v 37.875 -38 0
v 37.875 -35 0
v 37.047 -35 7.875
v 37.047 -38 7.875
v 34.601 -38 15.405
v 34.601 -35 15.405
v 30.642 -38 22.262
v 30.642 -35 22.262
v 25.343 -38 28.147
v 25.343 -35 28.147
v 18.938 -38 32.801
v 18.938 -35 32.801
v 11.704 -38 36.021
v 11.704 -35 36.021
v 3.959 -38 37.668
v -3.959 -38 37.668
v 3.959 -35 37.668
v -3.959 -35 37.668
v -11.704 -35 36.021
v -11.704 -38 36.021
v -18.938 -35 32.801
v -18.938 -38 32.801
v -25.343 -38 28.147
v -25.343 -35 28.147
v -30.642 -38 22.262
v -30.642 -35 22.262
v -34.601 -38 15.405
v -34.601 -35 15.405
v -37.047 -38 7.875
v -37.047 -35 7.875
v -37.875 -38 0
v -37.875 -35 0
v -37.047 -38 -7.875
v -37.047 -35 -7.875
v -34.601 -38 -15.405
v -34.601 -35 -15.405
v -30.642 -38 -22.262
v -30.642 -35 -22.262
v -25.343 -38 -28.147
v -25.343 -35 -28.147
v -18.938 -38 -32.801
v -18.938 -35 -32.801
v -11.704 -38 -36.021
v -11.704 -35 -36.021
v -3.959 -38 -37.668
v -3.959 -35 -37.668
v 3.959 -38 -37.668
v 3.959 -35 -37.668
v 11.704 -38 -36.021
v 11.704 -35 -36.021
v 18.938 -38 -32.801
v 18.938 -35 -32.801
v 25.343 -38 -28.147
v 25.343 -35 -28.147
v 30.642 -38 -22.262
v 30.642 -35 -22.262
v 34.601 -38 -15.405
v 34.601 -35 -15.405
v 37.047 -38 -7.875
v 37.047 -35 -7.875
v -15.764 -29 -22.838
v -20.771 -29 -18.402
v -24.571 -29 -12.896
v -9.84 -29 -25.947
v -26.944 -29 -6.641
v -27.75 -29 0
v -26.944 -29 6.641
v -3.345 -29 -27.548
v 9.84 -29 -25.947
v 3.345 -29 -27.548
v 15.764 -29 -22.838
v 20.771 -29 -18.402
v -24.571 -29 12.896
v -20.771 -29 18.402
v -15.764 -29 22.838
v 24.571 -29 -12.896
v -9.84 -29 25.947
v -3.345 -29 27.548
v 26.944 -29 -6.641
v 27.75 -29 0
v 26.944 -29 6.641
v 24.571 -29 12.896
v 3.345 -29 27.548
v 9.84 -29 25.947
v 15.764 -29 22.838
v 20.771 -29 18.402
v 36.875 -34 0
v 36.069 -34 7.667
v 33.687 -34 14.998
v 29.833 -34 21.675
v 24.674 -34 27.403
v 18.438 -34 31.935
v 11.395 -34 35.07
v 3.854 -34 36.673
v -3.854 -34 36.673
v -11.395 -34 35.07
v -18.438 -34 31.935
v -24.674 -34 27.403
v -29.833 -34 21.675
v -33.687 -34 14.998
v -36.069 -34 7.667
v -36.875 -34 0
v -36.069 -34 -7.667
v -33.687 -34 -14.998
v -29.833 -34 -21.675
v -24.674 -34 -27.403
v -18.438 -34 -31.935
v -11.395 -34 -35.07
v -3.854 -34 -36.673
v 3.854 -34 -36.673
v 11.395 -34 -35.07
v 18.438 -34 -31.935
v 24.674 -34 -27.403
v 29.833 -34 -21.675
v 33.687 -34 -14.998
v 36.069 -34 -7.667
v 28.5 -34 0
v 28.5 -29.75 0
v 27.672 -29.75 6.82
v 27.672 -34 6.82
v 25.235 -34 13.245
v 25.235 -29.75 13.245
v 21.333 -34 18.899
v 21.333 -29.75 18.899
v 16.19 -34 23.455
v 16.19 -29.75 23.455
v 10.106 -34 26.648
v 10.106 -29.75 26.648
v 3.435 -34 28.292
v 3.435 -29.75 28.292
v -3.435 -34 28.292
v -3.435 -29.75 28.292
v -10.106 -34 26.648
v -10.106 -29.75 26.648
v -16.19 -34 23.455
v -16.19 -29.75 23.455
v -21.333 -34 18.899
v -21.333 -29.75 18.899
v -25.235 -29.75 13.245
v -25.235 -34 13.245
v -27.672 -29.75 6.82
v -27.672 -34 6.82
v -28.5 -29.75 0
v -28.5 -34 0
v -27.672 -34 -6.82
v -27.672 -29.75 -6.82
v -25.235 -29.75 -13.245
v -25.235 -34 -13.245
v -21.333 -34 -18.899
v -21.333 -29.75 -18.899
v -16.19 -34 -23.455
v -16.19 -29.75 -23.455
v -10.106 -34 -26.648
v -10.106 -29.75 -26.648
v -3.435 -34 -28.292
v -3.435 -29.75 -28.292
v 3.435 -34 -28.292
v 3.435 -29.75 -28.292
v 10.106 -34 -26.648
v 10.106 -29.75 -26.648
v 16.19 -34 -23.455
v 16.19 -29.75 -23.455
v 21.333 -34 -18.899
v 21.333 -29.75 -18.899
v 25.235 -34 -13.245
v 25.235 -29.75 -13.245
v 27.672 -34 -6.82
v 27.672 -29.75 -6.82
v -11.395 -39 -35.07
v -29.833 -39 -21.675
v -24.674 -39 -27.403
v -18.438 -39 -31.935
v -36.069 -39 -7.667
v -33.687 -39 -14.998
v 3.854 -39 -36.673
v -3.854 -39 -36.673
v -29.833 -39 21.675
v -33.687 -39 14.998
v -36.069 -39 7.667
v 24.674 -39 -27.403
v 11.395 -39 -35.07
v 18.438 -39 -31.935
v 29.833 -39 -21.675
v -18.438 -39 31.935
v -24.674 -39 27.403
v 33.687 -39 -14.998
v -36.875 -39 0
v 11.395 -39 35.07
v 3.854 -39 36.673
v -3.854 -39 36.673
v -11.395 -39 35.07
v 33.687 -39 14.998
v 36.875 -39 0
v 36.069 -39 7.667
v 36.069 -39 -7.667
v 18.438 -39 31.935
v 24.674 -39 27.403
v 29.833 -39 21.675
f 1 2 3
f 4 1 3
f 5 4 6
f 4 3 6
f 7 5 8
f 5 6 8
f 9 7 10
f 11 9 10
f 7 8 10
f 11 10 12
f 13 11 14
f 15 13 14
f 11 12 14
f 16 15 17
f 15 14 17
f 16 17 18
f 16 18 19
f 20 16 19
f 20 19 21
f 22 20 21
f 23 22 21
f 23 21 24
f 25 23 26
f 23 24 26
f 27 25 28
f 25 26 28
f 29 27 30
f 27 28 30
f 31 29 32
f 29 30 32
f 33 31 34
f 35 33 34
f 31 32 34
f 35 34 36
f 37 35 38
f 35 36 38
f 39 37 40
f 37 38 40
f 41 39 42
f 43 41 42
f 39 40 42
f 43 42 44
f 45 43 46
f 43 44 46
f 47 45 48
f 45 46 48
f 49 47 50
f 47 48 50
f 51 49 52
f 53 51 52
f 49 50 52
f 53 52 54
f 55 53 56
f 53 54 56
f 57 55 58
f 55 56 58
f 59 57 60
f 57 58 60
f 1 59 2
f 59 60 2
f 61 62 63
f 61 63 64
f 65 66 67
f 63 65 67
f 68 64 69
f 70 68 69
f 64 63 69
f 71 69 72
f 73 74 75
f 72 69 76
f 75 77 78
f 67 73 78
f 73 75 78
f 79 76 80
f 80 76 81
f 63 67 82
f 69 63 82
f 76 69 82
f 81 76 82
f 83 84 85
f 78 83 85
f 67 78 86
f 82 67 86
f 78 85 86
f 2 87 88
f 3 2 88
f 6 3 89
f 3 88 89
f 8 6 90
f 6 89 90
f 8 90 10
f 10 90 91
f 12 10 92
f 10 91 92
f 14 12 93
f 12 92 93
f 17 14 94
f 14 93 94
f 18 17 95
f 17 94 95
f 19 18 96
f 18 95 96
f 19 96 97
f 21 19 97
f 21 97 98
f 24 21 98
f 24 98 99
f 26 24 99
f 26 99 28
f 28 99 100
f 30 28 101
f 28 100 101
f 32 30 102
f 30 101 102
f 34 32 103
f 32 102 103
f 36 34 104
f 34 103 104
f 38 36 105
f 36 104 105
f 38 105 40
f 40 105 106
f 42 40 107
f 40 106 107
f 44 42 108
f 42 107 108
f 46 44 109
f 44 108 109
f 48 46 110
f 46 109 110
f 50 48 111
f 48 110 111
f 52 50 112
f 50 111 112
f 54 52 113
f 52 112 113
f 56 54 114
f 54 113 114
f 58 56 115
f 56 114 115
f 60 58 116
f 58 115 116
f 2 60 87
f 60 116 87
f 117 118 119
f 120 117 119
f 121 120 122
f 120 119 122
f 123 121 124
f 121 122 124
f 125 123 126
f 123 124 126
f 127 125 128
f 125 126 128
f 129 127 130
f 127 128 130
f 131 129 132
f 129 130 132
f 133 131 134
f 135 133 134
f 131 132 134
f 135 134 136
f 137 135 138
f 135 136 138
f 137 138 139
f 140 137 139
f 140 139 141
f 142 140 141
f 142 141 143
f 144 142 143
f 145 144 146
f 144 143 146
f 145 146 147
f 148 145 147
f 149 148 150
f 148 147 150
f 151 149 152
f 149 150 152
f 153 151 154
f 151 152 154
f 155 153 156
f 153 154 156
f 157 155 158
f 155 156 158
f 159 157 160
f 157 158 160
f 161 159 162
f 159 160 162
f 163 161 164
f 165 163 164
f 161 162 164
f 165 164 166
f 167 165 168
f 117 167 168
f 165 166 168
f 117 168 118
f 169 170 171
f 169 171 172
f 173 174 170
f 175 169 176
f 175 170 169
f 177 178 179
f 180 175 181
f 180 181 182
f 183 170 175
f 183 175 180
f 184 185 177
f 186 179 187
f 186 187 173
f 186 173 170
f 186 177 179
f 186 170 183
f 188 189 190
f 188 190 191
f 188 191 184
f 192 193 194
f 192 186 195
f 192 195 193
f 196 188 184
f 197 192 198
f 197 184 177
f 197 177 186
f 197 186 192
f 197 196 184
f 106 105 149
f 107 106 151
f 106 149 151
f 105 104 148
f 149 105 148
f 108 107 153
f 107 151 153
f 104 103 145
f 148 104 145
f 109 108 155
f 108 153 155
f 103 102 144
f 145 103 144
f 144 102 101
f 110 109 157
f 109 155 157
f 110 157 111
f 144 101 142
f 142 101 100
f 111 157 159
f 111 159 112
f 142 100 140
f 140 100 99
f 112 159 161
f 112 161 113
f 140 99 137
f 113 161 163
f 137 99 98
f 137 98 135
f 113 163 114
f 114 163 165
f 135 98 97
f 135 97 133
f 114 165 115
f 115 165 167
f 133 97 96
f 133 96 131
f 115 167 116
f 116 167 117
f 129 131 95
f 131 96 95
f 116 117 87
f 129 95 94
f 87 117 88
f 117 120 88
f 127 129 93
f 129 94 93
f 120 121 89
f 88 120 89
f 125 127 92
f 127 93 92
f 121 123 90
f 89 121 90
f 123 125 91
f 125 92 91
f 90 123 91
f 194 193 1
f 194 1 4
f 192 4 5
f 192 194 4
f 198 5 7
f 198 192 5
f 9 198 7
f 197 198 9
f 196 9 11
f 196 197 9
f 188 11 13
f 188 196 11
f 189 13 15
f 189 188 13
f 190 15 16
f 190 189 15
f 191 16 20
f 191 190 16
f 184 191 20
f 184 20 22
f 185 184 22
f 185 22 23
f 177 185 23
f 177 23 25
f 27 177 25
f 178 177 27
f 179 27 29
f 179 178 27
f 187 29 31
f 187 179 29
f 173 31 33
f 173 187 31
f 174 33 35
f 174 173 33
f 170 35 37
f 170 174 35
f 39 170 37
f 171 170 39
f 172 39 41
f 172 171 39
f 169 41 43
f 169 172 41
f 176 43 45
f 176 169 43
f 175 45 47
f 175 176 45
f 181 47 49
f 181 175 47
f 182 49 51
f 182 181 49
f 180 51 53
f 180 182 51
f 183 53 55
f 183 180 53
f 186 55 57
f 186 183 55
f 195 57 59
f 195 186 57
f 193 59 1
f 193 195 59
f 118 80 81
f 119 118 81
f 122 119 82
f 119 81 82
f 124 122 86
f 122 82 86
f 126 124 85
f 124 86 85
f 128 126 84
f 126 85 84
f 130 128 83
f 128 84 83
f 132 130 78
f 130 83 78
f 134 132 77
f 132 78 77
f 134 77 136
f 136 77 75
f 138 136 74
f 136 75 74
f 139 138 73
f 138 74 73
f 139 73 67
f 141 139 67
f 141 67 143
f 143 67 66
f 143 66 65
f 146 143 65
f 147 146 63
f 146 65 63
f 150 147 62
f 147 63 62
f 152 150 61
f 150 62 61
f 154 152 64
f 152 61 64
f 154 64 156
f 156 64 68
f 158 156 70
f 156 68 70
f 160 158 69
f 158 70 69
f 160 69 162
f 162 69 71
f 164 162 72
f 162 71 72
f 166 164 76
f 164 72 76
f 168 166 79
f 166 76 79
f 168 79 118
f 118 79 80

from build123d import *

# Parameters (mm, degrees)
SKETCH001_R     = 28.5
PAD_DEPTH       = 5
SKETCH002_R     = 37.875
PAD001_DEPTH    = 5
CHAMFER_SIZE    = 1
CHAMFER001_SIZE = 0.75


with BuildPart() as part:
    # Sketch001 → Pad (new body)
    with BuildSketch(Plane.XZ.offset(29)):
        Circle(SKETCH001_R)
    extrude(amount=PAD_DEPTH)

    # Sketch002 (on Face3 of Pad) → Pad001 (join)
    with BuildSketch(Plane.XZ.offset(34)):
        Circle(SKETCH002_R)
    extrude(amount=PAD001_DEPTH)

    # Chamfer
    chamfer_edges = [part.edges().sort_by_distance(p)[0] for p in [
        (-37.875, -39, 0),
        (-37.875, -34, 0),
    ]]
    chamfer(chamfer_edges, length=CHAMFER_SIZE)

    # Chamfer001
    chamfer001_edges = [part.edges().sort_by_distance(p)[0] for p in [
        (-28.5, -29, 0),
    ]]
    chamfer(chamfer001_edges, length=CHAMFER001_SIZE)


solid = part.part
